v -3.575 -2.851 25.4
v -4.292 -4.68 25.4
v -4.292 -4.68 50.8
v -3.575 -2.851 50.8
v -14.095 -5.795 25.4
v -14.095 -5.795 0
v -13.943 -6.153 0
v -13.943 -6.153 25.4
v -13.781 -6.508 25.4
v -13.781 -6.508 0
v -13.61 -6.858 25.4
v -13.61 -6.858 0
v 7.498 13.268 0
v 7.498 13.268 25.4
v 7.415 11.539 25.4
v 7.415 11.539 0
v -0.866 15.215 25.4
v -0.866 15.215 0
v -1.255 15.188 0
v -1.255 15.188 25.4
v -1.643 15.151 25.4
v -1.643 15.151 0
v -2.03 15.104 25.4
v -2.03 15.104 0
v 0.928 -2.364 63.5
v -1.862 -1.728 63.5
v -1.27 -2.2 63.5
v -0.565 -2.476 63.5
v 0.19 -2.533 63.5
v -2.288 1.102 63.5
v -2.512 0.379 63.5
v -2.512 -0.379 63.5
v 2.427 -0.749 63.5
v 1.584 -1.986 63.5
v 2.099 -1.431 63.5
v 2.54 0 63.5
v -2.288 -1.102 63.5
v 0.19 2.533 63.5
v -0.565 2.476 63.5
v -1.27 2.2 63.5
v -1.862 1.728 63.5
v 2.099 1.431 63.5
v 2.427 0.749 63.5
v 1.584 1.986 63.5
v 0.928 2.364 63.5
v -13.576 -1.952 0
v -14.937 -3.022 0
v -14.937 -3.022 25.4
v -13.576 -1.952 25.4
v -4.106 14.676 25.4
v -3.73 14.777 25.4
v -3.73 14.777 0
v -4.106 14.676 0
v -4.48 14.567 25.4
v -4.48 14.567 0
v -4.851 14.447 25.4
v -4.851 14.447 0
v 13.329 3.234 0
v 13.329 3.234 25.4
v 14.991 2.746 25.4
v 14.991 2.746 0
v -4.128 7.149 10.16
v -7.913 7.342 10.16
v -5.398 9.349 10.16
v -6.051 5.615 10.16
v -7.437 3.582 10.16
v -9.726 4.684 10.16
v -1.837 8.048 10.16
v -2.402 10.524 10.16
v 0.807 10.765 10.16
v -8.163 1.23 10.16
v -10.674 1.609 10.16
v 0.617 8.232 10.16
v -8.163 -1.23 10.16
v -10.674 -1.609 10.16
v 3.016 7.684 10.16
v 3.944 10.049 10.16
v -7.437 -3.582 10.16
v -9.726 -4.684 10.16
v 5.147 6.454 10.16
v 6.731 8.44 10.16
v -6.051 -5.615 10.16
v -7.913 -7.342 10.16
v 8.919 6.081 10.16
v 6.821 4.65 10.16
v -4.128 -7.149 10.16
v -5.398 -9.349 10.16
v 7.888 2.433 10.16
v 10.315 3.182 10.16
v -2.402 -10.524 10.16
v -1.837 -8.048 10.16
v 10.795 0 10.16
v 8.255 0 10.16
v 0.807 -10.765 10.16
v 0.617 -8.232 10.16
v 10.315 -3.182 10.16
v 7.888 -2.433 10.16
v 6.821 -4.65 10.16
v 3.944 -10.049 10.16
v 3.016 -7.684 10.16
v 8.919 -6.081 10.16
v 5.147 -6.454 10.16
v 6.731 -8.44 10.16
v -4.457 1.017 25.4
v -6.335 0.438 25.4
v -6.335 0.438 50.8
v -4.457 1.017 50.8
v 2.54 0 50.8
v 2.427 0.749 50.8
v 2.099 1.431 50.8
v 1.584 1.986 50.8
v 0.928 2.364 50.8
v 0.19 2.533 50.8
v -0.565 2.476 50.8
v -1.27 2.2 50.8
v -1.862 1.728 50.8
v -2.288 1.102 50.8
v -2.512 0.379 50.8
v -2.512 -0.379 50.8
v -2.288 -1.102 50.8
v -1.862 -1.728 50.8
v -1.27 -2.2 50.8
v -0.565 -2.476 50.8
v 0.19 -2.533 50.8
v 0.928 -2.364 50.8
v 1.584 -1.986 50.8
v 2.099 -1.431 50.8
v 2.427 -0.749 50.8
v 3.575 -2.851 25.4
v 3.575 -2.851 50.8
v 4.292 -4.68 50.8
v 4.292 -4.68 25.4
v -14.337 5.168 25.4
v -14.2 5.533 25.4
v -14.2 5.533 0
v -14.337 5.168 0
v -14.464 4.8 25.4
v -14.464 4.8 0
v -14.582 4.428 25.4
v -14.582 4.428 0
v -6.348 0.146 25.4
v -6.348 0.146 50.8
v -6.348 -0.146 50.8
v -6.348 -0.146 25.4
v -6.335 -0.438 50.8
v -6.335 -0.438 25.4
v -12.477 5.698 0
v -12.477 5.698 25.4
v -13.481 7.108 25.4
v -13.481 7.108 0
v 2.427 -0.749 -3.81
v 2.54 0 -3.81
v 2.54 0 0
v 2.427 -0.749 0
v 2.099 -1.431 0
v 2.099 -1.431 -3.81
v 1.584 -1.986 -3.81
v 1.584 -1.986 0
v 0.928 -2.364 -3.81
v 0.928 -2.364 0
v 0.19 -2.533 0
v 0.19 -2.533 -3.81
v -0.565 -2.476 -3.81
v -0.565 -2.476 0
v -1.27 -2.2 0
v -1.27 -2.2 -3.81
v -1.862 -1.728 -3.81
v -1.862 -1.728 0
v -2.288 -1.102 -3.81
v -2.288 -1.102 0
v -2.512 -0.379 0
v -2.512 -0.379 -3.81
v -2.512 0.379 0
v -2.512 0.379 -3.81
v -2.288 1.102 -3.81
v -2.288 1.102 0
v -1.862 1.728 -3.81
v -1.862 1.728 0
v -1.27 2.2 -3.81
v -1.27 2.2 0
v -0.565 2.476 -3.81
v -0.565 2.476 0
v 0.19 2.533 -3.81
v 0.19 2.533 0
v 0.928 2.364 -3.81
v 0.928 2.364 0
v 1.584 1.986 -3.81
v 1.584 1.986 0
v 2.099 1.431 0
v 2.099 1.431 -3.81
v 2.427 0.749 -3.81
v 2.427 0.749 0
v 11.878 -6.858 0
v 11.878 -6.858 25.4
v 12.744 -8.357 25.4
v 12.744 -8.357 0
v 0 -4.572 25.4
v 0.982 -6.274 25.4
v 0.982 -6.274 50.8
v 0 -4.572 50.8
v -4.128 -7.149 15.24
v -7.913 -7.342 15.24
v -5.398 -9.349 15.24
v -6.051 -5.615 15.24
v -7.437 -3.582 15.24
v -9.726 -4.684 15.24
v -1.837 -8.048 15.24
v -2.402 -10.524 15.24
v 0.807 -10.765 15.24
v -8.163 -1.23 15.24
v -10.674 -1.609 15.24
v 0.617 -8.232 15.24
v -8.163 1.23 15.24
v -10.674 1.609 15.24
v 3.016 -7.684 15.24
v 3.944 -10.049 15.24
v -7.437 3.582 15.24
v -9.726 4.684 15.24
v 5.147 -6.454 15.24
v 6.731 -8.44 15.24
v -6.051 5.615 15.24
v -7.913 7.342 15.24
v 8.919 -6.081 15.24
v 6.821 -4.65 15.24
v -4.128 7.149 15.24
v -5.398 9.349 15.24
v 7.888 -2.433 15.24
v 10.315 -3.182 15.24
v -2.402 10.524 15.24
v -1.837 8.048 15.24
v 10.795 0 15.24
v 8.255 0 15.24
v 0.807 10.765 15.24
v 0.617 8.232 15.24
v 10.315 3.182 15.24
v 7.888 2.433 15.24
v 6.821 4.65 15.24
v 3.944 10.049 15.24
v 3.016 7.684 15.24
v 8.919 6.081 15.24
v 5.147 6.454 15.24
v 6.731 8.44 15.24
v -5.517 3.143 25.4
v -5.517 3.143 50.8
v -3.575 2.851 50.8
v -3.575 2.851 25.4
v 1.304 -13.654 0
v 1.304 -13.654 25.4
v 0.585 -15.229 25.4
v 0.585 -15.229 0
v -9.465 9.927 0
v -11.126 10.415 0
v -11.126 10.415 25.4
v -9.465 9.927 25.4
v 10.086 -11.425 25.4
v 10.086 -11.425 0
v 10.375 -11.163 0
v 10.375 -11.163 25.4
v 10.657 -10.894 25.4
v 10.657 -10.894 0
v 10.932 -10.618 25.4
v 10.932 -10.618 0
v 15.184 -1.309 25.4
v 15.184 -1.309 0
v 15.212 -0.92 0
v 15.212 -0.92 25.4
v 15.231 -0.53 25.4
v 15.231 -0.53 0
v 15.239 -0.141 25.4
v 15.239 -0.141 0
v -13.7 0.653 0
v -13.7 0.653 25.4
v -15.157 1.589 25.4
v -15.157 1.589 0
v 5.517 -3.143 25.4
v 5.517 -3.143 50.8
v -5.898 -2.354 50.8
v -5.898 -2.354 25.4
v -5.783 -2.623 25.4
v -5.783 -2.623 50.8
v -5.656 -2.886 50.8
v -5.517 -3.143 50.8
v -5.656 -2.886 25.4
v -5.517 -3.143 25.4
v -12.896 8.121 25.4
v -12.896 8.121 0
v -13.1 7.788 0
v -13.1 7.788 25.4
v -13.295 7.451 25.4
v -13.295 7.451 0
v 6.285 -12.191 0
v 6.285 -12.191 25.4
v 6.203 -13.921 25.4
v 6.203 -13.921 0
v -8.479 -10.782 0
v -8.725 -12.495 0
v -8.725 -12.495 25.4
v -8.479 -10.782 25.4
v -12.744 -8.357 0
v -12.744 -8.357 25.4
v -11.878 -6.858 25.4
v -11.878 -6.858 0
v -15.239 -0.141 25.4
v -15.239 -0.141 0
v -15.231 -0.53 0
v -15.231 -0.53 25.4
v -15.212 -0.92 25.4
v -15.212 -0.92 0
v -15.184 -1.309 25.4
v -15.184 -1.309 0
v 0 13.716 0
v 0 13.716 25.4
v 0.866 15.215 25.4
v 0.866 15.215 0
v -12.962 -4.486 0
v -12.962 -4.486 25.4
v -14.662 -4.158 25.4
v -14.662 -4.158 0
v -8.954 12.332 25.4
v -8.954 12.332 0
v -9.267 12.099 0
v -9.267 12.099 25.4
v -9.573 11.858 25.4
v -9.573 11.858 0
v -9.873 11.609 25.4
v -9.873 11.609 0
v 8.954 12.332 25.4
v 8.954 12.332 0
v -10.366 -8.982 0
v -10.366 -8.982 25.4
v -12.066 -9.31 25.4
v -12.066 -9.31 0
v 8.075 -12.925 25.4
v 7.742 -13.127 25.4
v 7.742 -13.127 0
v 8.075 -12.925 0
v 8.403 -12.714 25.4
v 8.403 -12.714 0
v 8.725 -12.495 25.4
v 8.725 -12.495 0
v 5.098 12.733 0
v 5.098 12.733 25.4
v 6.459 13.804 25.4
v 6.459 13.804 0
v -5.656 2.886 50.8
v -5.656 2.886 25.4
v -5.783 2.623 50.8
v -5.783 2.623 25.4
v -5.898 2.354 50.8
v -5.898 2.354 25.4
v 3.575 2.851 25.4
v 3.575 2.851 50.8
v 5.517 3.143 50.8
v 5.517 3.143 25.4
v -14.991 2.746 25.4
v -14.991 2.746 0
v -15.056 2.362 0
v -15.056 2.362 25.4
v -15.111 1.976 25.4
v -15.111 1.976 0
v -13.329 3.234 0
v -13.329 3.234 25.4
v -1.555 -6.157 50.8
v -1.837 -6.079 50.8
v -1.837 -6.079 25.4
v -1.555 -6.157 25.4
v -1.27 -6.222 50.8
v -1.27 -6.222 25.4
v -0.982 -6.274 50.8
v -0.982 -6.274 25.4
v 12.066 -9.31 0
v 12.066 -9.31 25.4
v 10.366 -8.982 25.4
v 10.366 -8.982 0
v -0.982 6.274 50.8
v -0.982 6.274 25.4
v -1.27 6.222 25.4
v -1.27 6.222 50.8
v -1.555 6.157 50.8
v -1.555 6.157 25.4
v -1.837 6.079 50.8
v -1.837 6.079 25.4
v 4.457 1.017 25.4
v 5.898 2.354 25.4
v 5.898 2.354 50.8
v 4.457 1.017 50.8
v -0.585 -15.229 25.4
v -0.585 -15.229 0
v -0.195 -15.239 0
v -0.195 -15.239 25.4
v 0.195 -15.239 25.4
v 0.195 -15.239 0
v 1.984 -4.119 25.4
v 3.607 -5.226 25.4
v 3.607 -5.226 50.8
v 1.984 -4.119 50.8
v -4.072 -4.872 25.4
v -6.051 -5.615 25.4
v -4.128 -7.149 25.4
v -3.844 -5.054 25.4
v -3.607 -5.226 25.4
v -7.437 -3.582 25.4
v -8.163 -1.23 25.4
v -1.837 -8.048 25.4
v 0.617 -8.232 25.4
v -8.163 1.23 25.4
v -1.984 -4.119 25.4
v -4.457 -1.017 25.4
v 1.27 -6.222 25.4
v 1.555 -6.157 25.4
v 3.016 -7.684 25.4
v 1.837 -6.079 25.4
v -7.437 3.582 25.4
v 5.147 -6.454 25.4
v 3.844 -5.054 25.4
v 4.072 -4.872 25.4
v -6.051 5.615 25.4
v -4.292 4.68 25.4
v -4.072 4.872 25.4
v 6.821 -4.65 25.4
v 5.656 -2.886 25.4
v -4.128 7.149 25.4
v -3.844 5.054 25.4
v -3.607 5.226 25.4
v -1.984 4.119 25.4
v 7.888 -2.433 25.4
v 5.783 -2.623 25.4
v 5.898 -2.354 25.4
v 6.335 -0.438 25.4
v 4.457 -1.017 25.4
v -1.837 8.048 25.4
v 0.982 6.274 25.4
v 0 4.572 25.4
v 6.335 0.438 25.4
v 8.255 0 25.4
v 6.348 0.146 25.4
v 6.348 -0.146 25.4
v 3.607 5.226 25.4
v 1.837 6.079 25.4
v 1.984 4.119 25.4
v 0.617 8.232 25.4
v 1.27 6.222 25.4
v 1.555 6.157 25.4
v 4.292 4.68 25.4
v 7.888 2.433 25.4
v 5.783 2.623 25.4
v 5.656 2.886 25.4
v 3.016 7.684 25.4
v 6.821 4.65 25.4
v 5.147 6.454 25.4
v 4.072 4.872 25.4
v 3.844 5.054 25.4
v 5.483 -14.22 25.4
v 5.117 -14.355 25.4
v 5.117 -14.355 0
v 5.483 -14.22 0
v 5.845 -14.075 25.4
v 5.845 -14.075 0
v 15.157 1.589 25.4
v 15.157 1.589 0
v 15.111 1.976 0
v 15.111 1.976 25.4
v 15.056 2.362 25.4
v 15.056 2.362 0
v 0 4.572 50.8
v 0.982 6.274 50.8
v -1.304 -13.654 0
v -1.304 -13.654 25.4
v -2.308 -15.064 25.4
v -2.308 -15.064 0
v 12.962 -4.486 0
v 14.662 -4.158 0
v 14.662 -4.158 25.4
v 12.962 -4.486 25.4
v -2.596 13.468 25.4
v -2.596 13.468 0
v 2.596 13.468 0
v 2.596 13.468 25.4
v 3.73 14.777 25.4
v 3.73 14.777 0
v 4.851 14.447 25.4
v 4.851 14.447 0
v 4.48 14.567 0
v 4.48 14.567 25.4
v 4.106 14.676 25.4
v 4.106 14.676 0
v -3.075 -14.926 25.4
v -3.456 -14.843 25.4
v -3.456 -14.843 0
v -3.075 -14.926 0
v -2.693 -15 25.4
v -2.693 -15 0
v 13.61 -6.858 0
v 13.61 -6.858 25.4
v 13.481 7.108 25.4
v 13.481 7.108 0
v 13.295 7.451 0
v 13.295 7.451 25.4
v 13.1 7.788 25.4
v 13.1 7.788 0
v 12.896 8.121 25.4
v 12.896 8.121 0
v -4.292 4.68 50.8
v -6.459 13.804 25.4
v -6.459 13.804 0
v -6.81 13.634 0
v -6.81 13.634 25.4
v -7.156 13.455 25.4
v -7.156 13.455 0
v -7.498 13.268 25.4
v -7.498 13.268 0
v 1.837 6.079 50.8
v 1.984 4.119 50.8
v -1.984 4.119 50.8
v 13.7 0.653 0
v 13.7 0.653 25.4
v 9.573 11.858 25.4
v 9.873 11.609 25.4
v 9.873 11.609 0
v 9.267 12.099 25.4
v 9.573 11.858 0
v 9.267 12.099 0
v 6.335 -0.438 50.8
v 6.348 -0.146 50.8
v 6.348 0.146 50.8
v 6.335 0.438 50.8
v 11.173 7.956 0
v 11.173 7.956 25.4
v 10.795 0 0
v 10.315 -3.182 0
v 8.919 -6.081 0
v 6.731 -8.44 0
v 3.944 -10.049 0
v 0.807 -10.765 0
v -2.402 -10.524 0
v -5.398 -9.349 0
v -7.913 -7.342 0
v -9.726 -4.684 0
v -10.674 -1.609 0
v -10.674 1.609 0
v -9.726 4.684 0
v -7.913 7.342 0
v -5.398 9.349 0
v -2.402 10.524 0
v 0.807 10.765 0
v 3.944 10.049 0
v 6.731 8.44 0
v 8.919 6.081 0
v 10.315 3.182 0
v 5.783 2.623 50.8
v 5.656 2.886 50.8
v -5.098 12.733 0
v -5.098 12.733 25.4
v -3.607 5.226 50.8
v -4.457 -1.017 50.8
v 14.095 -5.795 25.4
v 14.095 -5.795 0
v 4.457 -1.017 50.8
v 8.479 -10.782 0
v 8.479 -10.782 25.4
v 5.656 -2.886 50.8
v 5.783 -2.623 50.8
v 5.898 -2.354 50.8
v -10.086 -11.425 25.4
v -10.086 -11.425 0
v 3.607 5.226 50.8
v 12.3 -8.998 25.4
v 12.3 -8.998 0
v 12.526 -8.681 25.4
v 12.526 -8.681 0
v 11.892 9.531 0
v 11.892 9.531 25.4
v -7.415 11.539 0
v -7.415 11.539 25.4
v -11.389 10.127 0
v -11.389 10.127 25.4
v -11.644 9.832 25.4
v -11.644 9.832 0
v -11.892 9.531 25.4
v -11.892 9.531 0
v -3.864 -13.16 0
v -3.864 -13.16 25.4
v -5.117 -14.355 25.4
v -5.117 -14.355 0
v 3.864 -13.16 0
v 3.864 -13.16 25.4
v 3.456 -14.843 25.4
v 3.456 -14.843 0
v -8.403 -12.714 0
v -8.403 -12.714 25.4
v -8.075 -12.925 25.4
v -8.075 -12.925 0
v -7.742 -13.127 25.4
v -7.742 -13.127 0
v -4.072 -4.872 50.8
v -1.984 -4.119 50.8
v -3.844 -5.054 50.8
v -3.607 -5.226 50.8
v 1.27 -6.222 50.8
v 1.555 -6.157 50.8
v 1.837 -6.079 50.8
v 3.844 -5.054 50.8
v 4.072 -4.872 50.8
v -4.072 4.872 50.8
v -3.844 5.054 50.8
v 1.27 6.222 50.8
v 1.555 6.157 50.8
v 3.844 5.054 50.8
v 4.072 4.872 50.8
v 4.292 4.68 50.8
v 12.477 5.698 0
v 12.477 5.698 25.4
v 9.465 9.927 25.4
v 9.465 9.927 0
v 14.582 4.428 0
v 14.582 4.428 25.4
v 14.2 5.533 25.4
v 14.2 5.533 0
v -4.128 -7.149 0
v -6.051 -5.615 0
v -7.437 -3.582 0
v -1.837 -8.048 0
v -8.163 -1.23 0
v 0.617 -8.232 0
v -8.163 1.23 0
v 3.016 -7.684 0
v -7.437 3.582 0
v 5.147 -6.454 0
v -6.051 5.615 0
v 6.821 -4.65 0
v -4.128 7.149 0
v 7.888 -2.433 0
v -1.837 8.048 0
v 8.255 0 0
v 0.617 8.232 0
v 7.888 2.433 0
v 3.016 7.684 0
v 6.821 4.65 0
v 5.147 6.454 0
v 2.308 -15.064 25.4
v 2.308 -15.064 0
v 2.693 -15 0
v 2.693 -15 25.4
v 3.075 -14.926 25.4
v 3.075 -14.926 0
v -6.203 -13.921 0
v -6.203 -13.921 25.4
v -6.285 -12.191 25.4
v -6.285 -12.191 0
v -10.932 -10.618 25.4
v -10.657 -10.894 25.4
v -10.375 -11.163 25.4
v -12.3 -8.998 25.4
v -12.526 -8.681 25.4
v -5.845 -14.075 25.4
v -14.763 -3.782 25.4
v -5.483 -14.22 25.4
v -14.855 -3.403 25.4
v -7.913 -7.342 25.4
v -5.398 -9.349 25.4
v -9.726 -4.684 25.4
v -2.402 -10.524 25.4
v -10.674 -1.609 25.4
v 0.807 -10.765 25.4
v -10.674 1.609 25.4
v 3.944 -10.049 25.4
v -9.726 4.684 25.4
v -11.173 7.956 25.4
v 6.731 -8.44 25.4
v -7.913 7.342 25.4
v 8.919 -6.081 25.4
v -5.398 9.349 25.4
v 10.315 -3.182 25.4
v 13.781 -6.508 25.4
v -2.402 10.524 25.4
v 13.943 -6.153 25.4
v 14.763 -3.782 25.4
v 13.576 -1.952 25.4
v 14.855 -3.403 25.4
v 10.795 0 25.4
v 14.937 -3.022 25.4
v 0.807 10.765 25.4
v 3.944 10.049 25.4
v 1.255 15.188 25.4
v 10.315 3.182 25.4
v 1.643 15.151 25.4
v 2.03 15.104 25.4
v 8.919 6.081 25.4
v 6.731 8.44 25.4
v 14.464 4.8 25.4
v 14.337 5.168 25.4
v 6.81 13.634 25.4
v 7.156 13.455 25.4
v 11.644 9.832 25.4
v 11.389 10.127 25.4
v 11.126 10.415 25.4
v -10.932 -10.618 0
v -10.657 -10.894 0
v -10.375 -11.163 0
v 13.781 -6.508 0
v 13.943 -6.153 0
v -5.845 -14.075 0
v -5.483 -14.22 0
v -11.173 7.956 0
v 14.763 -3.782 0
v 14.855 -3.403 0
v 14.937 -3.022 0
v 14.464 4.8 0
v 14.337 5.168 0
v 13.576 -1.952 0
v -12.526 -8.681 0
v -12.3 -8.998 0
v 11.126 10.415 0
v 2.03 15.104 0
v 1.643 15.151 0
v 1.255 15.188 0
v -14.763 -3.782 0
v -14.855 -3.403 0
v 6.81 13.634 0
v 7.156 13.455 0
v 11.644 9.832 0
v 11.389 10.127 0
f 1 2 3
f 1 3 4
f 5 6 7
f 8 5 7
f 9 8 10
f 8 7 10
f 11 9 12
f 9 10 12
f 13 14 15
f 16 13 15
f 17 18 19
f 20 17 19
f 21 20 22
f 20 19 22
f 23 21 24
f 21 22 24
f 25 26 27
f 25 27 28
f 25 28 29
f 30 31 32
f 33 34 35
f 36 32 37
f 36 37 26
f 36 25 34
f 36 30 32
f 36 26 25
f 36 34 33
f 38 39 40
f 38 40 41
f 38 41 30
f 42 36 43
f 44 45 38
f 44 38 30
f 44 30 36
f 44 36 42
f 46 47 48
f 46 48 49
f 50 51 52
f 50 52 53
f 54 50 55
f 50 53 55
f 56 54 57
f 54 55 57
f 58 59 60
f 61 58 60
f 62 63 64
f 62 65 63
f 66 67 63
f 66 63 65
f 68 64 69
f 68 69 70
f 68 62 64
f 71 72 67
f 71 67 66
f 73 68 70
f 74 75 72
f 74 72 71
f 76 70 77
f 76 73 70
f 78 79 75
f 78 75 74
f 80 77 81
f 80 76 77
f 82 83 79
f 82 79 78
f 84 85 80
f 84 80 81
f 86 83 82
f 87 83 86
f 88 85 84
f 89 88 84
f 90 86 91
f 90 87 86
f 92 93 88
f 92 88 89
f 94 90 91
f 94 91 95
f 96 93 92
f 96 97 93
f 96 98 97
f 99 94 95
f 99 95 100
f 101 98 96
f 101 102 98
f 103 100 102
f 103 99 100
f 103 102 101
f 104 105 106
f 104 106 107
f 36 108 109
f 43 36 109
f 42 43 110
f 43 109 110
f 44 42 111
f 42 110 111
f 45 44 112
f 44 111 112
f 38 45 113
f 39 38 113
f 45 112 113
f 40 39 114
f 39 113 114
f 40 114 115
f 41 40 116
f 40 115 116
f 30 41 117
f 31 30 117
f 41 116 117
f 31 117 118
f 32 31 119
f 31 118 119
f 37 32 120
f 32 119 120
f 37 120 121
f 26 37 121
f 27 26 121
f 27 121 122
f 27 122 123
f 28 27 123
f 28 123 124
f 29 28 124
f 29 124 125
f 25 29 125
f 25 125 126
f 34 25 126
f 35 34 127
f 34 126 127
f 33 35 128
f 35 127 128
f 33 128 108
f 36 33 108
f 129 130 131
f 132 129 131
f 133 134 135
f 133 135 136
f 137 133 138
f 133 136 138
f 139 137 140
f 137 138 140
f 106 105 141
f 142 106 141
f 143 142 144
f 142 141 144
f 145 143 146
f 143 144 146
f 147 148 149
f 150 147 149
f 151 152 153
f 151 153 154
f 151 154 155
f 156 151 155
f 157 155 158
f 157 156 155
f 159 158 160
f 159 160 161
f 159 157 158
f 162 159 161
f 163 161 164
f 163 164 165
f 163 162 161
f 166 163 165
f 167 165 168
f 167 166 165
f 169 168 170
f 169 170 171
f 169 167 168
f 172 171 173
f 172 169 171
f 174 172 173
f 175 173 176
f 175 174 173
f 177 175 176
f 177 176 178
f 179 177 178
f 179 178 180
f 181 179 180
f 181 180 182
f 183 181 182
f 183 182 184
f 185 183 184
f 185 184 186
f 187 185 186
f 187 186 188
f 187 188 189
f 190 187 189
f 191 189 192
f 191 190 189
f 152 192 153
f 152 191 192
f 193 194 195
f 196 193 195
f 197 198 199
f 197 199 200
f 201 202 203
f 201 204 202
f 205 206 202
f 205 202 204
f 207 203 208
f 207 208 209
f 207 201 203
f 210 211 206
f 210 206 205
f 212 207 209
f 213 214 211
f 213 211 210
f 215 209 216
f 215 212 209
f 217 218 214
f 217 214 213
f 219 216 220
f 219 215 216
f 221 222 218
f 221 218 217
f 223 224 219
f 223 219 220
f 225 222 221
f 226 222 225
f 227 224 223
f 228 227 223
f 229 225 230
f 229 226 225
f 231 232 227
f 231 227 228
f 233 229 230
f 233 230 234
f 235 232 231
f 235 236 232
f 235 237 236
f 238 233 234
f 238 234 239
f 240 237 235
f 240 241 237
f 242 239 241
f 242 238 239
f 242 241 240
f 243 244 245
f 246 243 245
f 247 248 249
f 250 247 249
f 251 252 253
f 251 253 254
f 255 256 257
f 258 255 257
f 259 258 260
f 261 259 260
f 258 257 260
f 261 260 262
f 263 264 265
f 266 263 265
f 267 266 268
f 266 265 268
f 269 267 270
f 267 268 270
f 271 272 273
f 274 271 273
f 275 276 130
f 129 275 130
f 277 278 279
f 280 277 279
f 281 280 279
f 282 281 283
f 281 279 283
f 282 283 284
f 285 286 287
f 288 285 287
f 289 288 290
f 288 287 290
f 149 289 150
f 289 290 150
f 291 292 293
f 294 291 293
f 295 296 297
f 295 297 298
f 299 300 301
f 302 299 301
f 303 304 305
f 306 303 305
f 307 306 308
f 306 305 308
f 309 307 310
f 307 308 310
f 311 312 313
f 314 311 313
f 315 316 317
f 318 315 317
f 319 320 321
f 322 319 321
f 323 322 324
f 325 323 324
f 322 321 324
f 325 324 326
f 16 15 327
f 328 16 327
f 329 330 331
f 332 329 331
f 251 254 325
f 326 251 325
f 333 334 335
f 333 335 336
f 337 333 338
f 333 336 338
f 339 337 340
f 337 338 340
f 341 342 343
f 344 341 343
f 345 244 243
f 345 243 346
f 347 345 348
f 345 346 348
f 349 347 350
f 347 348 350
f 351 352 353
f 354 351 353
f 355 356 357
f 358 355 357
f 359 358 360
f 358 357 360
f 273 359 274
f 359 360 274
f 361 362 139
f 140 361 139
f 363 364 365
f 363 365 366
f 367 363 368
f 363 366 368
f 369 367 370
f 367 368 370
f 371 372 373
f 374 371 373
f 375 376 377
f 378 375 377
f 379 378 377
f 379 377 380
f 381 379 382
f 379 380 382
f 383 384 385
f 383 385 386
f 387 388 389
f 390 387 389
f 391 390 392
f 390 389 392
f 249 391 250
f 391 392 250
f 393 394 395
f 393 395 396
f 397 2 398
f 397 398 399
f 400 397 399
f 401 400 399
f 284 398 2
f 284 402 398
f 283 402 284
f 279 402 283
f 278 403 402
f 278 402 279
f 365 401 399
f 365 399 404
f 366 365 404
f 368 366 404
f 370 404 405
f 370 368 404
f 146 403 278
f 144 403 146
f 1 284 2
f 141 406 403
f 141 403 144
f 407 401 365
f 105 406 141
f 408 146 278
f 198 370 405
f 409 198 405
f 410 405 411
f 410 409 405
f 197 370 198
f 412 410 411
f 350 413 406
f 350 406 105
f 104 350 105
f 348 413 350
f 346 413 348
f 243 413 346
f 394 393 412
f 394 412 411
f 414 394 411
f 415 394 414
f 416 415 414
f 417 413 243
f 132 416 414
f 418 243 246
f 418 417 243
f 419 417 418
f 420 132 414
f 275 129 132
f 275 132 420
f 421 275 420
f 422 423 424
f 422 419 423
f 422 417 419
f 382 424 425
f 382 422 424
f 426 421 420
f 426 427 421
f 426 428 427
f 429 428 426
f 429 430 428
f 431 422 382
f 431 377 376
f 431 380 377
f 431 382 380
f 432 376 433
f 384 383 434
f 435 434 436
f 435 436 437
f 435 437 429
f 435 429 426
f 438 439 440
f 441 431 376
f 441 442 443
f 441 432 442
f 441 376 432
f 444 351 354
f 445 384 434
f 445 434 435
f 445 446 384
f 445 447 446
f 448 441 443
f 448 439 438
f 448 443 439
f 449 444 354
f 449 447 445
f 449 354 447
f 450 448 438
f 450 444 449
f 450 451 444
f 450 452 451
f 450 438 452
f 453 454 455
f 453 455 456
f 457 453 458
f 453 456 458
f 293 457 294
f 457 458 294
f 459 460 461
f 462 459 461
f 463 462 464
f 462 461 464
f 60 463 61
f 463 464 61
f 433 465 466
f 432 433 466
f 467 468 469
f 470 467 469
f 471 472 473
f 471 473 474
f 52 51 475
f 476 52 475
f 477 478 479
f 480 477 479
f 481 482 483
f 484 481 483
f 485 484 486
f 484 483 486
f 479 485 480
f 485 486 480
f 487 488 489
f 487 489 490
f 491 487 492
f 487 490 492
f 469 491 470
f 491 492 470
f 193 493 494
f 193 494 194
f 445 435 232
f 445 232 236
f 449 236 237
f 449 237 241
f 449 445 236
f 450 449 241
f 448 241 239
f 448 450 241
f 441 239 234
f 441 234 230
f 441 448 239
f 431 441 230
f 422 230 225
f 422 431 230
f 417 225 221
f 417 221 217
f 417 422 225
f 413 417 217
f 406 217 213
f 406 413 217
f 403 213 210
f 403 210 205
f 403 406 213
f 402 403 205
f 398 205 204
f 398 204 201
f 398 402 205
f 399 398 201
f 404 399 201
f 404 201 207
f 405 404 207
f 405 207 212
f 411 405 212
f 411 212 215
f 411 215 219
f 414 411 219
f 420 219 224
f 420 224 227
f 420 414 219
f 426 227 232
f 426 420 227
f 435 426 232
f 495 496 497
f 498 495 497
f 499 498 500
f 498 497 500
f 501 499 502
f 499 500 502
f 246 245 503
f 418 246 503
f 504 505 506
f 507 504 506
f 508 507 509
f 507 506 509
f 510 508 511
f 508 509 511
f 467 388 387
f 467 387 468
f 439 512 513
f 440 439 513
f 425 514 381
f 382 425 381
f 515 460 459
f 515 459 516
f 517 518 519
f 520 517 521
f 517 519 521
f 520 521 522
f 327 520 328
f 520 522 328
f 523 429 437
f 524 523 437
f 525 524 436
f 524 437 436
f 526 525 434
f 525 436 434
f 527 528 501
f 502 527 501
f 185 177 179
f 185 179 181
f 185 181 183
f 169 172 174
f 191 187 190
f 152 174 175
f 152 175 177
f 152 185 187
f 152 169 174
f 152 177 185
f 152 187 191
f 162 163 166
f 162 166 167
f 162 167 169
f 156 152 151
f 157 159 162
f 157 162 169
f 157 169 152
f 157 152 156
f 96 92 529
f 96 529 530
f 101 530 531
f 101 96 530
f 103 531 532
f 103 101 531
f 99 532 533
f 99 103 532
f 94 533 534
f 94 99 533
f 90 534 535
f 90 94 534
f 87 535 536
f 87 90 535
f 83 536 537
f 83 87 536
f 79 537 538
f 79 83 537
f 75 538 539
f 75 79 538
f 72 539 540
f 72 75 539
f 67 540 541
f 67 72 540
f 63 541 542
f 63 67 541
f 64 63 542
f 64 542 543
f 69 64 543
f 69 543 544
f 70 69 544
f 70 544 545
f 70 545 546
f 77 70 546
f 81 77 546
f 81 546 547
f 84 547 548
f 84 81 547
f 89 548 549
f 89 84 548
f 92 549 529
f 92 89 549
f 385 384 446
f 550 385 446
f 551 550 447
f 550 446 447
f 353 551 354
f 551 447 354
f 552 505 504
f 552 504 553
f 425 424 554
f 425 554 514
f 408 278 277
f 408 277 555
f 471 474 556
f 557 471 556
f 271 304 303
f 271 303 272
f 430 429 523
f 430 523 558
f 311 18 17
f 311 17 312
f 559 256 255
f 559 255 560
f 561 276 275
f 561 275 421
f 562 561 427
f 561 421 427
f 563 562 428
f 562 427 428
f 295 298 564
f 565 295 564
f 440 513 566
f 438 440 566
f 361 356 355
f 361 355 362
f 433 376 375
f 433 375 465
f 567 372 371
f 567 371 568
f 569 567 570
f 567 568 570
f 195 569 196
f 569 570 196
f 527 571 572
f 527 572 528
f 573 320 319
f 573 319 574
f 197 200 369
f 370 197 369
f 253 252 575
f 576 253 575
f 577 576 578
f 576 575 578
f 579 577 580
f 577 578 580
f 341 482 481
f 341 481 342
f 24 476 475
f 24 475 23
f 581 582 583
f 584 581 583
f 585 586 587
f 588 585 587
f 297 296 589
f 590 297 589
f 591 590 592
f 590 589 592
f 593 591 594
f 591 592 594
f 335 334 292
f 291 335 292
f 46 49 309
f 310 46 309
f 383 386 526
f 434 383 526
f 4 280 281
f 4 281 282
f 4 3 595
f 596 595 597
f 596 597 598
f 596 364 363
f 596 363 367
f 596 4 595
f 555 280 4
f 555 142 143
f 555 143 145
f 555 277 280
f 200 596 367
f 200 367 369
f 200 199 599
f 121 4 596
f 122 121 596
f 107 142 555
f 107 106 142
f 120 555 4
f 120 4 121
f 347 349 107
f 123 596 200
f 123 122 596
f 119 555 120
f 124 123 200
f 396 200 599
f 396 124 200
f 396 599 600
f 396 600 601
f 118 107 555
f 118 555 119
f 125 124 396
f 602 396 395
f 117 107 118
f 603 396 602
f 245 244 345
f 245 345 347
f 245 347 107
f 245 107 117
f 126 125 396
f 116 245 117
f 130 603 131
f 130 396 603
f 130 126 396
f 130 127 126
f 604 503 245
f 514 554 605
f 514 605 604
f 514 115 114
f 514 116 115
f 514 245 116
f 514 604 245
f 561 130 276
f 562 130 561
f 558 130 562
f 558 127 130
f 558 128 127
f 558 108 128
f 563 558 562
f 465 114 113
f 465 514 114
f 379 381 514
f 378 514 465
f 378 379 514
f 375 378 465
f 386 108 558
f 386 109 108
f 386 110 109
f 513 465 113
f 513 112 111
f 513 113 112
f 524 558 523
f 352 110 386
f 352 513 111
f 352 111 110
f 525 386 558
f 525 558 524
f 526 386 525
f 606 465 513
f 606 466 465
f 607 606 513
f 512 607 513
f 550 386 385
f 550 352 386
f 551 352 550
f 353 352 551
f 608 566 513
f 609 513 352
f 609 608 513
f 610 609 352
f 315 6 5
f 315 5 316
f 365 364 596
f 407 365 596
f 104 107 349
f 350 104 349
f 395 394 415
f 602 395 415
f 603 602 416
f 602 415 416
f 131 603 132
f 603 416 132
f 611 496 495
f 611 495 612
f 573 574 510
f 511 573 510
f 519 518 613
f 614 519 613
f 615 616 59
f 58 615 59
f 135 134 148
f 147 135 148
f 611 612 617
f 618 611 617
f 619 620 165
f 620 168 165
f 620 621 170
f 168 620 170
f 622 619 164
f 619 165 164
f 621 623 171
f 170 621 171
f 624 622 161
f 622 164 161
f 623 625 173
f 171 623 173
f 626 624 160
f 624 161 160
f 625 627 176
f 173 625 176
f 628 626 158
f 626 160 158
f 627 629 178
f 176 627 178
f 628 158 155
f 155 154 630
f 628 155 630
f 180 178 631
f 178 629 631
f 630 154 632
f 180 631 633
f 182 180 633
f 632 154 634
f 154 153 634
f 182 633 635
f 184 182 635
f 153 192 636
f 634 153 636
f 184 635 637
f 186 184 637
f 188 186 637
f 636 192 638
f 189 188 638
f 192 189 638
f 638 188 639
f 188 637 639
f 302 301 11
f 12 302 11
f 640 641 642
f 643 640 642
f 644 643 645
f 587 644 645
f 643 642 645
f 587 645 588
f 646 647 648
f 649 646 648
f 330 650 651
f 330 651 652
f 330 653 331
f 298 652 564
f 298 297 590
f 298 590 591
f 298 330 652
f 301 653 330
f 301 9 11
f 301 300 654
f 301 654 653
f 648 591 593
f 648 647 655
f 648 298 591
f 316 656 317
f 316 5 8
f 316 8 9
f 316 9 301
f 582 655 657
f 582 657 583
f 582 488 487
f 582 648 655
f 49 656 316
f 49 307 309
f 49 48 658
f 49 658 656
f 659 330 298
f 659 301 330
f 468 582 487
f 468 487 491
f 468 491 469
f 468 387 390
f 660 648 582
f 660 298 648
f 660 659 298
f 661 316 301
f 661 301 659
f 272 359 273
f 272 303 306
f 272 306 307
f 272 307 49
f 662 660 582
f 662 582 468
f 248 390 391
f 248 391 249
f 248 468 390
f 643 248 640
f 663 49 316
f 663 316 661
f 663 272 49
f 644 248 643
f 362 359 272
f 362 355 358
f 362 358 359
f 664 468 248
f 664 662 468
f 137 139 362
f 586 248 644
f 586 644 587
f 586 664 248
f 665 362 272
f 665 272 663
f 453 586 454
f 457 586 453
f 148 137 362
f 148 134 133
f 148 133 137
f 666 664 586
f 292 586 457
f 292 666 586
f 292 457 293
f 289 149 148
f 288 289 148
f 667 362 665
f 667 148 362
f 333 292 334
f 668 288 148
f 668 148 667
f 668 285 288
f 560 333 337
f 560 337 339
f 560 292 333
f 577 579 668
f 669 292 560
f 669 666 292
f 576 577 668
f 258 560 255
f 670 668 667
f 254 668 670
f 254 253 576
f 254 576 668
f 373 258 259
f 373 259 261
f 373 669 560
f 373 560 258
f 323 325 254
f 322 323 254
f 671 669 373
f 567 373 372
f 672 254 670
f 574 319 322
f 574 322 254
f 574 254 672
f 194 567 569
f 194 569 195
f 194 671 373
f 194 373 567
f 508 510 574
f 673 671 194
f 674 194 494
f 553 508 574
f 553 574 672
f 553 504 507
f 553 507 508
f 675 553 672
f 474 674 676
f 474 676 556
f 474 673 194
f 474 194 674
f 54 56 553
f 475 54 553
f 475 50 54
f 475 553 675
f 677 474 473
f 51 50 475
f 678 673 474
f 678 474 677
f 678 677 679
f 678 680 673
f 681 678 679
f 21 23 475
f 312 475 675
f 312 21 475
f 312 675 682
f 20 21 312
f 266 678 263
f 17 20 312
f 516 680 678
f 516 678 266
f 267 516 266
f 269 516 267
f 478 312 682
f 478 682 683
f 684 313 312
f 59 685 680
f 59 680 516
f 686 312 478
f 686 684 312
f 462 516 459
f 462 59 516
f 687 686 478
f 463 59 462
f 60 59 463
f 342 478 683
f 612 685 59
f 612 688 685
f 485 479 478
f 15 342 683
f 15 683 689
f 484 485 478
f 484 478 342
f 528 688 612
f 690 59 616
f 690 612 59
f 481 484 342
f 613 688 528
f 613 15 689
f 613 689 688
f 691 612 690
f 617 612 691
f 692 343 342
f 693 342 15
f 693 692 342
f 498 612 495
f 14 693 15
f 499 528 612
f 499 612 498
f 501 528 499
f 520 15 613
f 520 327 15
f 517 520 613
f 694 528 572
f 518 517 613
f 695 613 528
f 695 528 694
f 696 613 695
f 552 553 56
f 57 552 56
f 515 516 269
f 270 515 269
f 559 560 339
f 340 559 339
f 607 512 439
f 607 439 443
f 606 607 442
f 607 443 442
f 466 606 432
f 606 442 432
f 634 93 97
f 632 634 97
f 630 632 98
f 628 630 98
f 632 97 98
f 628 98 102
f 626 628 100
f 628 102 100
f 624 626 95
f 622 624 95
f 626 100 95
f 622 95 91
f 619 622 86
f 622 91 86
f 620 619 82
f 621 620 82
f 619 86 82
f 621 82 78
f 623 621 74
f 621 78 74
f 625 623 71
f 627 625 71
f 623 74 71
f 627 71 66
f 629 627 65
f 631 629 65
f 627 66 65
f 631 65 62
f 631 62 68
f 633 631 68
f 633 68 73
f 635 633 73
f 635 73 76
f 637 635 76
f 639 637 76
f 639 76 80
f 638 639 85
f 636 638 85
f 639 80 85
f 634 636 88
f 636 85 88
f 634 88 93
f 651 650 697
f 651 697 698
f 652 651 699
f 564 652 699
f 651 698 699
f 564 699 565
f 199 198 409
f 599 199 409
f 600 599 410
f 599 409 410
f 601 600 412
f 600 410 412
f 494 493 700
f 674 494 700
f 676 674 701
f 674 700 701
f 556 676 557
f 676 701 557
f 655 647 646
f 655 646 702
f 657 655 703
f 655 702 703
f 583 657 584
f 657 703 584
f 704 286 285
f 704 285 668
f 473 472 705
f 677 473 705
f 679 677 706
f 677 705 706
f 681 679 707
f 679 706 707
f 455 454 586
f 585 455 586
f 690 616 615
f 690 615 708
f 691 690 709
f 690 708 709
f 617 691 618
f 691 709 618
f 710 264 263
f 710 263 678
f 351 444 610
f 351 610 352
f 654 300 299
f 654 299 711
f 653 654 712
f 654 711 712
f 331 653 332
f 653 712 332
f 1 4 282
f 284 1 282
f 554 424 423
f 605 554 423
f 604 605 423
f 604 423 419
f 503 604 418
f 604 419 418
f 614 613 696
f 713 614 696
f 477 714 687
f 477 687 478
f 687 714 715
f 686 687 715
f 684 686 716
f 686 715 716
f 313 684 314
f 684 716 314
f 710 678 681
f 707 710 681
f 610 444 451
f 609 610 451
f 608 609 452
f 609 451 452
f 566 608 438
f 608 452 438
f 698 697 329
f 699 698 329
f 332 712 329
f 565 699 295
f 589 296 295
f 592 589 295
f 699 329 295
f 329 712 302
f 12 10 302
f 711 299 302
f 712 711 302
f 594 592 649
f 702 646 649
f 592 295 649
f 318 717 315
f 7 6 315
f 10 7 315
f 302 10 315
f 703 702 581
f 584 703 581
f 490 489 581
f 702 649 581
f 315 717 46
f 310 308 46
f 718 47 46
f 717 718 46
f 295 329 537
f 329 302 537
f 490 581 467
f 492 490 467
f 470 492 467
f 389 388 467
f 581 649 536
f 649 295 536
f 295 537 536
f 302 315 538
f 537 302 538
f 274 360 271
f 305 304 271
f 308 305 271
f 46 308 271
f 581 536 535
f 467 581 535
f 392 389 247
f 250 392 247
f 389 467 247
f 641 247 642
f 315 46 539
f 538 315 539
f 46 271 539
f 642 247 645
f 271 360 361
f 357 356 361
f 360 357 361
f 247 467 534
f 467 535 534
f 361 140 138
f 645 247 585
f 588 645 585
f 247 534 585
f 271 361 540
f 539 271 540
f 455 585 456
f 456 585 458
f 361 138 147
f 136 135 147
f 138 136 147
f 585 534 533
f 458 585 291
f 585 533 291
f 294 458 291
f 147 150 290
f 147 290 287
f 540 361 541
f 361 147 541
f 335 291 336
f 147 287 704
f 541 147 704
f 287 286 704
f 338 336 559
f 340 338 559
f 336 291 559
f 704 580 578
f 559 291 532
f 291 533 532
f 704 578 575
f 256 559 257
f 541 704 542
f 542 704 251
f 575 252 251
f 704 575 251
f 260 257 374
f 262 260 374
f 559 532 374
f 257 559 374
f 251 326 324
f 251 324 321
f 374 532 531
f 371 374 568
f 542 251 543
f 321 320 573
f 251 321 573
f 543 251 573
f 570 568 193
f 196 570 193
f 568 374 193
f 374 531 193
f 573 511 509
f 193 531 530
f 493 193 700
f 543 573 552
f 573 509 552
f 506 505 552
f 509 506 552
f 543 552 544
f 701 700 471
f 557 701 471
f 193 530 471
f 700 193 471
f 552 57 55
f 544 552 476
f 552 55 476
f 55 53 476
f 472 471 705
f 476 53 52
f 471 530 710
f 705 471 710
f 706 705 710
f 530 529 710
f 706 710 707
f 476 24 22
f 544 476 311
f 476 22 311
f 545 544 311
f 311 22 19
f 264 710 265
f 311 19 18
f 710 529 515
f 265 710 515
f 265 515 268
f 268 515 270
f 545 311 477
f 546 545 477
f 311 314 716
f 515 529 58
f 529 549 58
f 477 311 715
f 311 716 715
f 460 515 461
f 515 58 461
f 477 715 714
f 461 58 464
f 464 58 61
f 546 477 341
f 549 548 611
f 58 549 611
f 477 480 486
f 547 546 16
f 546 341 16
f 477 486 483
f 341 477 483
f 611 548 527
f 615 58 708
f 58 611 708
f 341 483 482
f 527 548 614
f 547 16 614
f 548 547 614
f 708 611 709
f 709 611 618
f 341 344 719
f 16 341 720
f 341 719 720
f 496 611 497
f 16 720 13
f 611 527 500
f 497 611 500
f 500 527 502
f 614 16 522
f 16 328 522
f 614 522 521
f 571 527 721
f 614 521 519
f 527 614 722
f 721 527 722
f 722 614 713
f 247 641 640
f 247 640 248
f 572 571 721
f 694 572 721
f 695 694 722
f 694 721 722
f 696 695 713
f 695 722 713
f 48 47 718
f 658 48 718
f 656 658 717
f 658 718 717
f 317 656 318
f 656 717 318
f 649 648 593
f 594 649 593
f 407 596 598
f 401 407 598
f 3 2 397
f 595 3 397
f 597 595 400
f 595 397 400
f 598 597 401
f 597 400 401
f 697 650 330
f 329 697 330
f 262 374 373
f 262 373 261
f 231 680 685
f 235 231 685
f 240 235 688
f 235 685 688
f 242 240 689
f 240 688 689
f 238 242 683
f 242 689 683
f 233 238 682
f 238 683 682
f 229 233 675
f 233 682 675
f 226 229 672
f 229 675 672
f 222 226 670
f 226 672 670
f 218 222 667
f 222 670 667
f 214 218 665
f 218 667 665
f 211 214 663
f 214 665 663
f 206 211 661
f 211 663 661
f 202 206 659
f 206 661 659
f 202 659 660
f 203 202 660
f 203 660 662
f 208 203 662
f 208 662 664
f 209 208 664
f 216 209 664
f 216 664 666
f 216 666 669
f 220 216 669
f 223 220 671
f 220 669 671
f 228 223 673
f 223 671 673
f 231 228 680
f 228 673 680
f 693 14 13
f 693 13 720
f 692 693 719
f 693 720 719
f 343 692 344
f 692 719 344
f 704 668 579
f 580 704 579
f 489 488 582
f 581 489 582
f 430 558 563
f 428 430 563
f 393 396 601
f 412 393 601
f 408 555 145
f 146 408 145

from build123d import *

# Parameters (mm, degrees)
SKETCH1_R           = 15.24
BOSS_EXTRUDE1_DEPTH = 25.4
CUT_EXTRUDE1_DEPTH  = 25.4
SKETCH3_R           = 6.35
BOSS_EXTRUDE2_DEPTH = 25.4
CUT_EXTRUDE2_DEPTH  = 25.4
SKETCH6_R           = 10.795
SKETCH6_R_2         = 8.255
CUT_EXTRUDE3_DEPTH  = 10.16
CUT_EXTRUDE4_START  = -10.16
SKETCH7_R           = 10.795
SKETCH7_R_2         = 8.255
CUT_EXTRUDE4_DEPTH  = 10.16
SKETCH8_R           = 2.54
BOSS_EXTRUDE3_DEPTH = 12.7
BOSS_EXTRUDE4_START = 3.81
SKETCH9_R           = 2.54
BOSS_EXTRUDE4_DEPTH = 3.81


with BuildPart() as part:
    # Sketch1 → Boss-Extrude1 (new body)
    with BuildSketch(Plane.XY):
        Circle(SKETCH1_R)
    extrude(amount=BOSS_EXTRUDE1_DEPTH)

    # Sketch2 → Cut-Extrude1 (cut)
    with BuildSketch(Plane.XY.offset(25.4)):
        Polygon((2.595770068, 13.468134012), (4.324370212, 15.463044922), (1.732426613, 15.962601105), align=None)
        Polygon((0, 13.716), (1.319822715, 16.002), (-1.319822715, 16.002), align=None)
        Polygon((5.097722242, 12.733494569), (7.172623702, 14.365215113), (4.722061529, 15.346272216), align=None)
        Polygon((7.415429452, 11.538633456), (9.761639883, 12.748189001), (7.541028839, 14.175289064), align=None)
        Polygon((9.465123721, 9.926736067), (11.997844965, 10.670410123), (10.087443718, 12.491974033), align=None)
        Polygon((11.172723758, 7.956060572), (13.80041667, 8.206974822), (12.269272099, 10.357166512), align=None)
        Polygon((12.476512448, 5.697832318), (15.10420536, 5.446918068), (14.007657019, 7.848024008), align=None)
        Polygon((13.329367471, 3.233669559), (15.862088715, 2.489995503), (15.239768718, 5.055233469), align=None)
        Polygon((13.700464424, 0.652633557), (16.046674855, -0.556921987), (15.921075468, 2.079733621), align=None)
        Polygon((13.576390897, -1.951990322), (15.651292357, -3.583710865), (16.026953069, -0.970933219), align=None)
        Polygon((12.961631229, -4.486064185), (14.690231374, -6.480975096), (15.553574829, -3.986508002), align=None)
        Polygon((11.878404438, -6.858), (13.198227154, -9.144), (14.518049869, -6.858), align=None)
        Polygon((10.365861162, -8.982069827), (11.229204617, -11.47653692), (12.957804761, -9.481626009), align=None)
        Polygon((8.478668655, -10.781504247), (8.854329368, -13.394281894), (10.929230827, -11.76256135), align=None)
        Polygon((6.285034972, -12.191267014), (6.159435585, -14.827922622), (8.505646016, -13.618367077), align=None)
        Polygon((3.86424375, -13.160405626), (3.241923753, -15.725643592), (5.774644996, -14.981969536), align=None)
        Polygon((1.30378869, -13.65389289), (0.207240349, -16.05499883), (2.834933261, -15.80408458), align=None)
        Polygon((-1.30378869, -13.65389289), (-2.834933261, -15.80408458), (-0.207240349, -16.05499883), align=None)
        Polygon((-3.86424375, -13.160405626), (-5.774644996, -14.981969536), (-3.241923753, -15.725643592), align=None)
        Polygon((-6.285034972, -12.191267014), (-8.505646016, -13.618367077), (-6.159435585, -14.827922622), align=None)
        Polygon((-8.478668655, -10.781504247), (-10.929230827, -11.76256135), (-8.854329368, -13.394281894), align=None)
        Polygon((-10.365861162, -8.982069827), (-12.957804761, -9.481626009), (-11.229204617, -11.47653692), align=None)
        Polygon((-11.878404438, -6.858), (-14.518049869, -6.858), (-13.198227154, -9.144), align=None)
        Polygon((-12.961631229, -4.486064185), (-15.553574829, -3.986508002), (-14.690231374, -6.480975096), align=None)
        Polygon((-13.576390897, -1.951990322), (-16.026953069, -0.970933219), (-15.651292357, -3.583710865), align=None)
        Polygon((-13.700464424, 0.652633557), (-15.921075468, 2.079733621), (-16.046674855, -0.556921987), align=None)
        Polygon((-13.329367471, 3.233669559), (-15.239768718, 5.055233469), (-15.862088715, 2.489995503), align=None)
        Polygon((-12.476512448, 5.697832318), (-14.007657019, 7.848024008), (-15.10420536, 5.446918068), align=None)
        Polygon((-11.172723758, 7.956060572), (-12.269272099, 10.357166512), (-13.80041667, 8.206974822), align=None)
        Polygon((-9.465123721, 9.926736067), (-10.087443718, 12.491974033), (-11.997844965, 10.670410123), align=None)
        Polygon((-7.415429452, 11.538633456), (-7.541028839, 14.175289064), (-9.761639883, 12.748189001), align=None)
        Polygon((-5.097722242, 12.733494569), (-4.722061529, 15.346272216), (-7.172623702, 14.365215113), align=None)
        Polygon((-2.595770068, 13.468134012), (-1.732426613, 15.962601105), (-4.324370212, 15.463044922), align=None)
    extrude(amount=-CUT_EXTRUDE1_DEPTH, mode=Mode.SUBTRACT)

    # Sketch3 → Boss-Extrude2 (add)
    with BuildSketch(Plane.XY.offset(25.4)):
        Circle(SKETCH3_R)
    extrude(amount=BOSS_EXTRUDE2_DEPTH)

    # Sketch5 → Cut-Extrude2 (cut)
    with BuildSketch(Plane.XY.offset(50.8)):
        Polygon((1.983716455, 4.119229664), (4.528190095, 5.854022418), (1.75357868, 7.190204852), align=None)
        Polygon((0, 4.572), (1.539793168, 7.239), (-1.539793168, 7.239), align=None)
        Polygon((3.574533538, 2.850595374), (6.619723439, 3.3095839), (4.699632764, 5.717301451), align=None)
        Polygon((4.457370414, 1.01736571), (7.40013937, 0.109641703), (6.714866942, 3.112016379), align=None)
        Polygon((4.457370414, -1.01736571), (6.714866942, -3.112016379), (7.40013937, -0.109641703), align=None)
        Polygon((3.574533538, -2.850595374), (4.699632764, -5.717301451), (6.619723439, -3.3095839), align=None)
        Polygon((1.983716455, -4.119229664), (1.75357868, -7.190204852), (4.528190095, -5.854022418), align=None)
        Polygon((0, -4.572), (-1.539793168, -7.239), (1.539793168, -7.239), align=None)
        Polygon((-1.983716455, -4.119229664), (-4.528190095, -5.854022418), (-1.75357868, -7.190204852), align=None)
        Polygon((-3.574533538, -2.850595374), (-6.619723439, -3.3095839), (-4.699632764, -5.717301451), align=None)
        Polygon((-4.457370414, -1.01736571), (-7.40013937, -0.109641703), (-6.714866942, -3.112016379), align=None)
        Polygon((-4.457370414, 1.01736571), (-6.714866942, 3.112016379), (-7.40013937, 0.109641703), align=None)
        Polygon((-3.574533538, 2.850595374), (-4.699632764, 5.717301451), (-6.619723439, 3.3095839), align=None)
        Polygon((-1.983716455, 4.119229664), (-1.75357868, 7.190204852), (-4.528190095, 5.854022418), align=None)
    extrude(amount=-CUT_EXTRUDE2_DEPTH, mode=Mode.SUBTRACT)

    # Sketch6 → Cut-Extrude3 (cut)
    with BuildSketch(Plane.XY.offset(25.4)):
        Circle(SKETCH6_R)
        Circle(SKETCH6_R_2, mode=Mode.SUBTRACT)
    extrude(amount=-CUT_EXTRUDE3_DEPTH, mode=Mode.SUBTRACT)

    # Sketch7 → Cut-Extrude4 (cut)
    with BuildSketch(Plane(origin=(0, 0, 0), x_dir=(-1, 0, 0), z_dir=(0, 0, -1)).offset(CUT_EXTRUDE4_START)):
        with Locations(Location((0, 0, 0), (0, 0, 180))):
            Circle(SKETCH7_R)
        with Locations(Location((0, 0, 0), (0, 0, 180))):
            Circle(SKETCH7_R_2, mode=Mode.SUBTRACT)
    extrude(amount=CUT_EXTRUDE4_DEPTH, mode=Mode.SUBTRACT)

    # Sketch8 → Boss-Extrude3 (add)
    with BuildSketch(Plane.XY.offset(50.8)):
        Circle(SKETCH8_R)
    extrude(amount=BOSS_EXTRUDE3_DEPTH)

    # Sketch9 → Boss-Extrude4 (add)
    with BuildSketch(Plane(origin=(0, 0, 0), x_dir=(-1, 0, 0), z_dir=(0, 0, -1)).offset(BOSS_EXTRUDE4_START)):
        with Locations(Location((0, 0, 0), (0, 0, 180))):
            Circle(SKETCH9_R)
    extrude(amount=-BOSS_EXTRUDE4_DEPTH)


solid = part.part
